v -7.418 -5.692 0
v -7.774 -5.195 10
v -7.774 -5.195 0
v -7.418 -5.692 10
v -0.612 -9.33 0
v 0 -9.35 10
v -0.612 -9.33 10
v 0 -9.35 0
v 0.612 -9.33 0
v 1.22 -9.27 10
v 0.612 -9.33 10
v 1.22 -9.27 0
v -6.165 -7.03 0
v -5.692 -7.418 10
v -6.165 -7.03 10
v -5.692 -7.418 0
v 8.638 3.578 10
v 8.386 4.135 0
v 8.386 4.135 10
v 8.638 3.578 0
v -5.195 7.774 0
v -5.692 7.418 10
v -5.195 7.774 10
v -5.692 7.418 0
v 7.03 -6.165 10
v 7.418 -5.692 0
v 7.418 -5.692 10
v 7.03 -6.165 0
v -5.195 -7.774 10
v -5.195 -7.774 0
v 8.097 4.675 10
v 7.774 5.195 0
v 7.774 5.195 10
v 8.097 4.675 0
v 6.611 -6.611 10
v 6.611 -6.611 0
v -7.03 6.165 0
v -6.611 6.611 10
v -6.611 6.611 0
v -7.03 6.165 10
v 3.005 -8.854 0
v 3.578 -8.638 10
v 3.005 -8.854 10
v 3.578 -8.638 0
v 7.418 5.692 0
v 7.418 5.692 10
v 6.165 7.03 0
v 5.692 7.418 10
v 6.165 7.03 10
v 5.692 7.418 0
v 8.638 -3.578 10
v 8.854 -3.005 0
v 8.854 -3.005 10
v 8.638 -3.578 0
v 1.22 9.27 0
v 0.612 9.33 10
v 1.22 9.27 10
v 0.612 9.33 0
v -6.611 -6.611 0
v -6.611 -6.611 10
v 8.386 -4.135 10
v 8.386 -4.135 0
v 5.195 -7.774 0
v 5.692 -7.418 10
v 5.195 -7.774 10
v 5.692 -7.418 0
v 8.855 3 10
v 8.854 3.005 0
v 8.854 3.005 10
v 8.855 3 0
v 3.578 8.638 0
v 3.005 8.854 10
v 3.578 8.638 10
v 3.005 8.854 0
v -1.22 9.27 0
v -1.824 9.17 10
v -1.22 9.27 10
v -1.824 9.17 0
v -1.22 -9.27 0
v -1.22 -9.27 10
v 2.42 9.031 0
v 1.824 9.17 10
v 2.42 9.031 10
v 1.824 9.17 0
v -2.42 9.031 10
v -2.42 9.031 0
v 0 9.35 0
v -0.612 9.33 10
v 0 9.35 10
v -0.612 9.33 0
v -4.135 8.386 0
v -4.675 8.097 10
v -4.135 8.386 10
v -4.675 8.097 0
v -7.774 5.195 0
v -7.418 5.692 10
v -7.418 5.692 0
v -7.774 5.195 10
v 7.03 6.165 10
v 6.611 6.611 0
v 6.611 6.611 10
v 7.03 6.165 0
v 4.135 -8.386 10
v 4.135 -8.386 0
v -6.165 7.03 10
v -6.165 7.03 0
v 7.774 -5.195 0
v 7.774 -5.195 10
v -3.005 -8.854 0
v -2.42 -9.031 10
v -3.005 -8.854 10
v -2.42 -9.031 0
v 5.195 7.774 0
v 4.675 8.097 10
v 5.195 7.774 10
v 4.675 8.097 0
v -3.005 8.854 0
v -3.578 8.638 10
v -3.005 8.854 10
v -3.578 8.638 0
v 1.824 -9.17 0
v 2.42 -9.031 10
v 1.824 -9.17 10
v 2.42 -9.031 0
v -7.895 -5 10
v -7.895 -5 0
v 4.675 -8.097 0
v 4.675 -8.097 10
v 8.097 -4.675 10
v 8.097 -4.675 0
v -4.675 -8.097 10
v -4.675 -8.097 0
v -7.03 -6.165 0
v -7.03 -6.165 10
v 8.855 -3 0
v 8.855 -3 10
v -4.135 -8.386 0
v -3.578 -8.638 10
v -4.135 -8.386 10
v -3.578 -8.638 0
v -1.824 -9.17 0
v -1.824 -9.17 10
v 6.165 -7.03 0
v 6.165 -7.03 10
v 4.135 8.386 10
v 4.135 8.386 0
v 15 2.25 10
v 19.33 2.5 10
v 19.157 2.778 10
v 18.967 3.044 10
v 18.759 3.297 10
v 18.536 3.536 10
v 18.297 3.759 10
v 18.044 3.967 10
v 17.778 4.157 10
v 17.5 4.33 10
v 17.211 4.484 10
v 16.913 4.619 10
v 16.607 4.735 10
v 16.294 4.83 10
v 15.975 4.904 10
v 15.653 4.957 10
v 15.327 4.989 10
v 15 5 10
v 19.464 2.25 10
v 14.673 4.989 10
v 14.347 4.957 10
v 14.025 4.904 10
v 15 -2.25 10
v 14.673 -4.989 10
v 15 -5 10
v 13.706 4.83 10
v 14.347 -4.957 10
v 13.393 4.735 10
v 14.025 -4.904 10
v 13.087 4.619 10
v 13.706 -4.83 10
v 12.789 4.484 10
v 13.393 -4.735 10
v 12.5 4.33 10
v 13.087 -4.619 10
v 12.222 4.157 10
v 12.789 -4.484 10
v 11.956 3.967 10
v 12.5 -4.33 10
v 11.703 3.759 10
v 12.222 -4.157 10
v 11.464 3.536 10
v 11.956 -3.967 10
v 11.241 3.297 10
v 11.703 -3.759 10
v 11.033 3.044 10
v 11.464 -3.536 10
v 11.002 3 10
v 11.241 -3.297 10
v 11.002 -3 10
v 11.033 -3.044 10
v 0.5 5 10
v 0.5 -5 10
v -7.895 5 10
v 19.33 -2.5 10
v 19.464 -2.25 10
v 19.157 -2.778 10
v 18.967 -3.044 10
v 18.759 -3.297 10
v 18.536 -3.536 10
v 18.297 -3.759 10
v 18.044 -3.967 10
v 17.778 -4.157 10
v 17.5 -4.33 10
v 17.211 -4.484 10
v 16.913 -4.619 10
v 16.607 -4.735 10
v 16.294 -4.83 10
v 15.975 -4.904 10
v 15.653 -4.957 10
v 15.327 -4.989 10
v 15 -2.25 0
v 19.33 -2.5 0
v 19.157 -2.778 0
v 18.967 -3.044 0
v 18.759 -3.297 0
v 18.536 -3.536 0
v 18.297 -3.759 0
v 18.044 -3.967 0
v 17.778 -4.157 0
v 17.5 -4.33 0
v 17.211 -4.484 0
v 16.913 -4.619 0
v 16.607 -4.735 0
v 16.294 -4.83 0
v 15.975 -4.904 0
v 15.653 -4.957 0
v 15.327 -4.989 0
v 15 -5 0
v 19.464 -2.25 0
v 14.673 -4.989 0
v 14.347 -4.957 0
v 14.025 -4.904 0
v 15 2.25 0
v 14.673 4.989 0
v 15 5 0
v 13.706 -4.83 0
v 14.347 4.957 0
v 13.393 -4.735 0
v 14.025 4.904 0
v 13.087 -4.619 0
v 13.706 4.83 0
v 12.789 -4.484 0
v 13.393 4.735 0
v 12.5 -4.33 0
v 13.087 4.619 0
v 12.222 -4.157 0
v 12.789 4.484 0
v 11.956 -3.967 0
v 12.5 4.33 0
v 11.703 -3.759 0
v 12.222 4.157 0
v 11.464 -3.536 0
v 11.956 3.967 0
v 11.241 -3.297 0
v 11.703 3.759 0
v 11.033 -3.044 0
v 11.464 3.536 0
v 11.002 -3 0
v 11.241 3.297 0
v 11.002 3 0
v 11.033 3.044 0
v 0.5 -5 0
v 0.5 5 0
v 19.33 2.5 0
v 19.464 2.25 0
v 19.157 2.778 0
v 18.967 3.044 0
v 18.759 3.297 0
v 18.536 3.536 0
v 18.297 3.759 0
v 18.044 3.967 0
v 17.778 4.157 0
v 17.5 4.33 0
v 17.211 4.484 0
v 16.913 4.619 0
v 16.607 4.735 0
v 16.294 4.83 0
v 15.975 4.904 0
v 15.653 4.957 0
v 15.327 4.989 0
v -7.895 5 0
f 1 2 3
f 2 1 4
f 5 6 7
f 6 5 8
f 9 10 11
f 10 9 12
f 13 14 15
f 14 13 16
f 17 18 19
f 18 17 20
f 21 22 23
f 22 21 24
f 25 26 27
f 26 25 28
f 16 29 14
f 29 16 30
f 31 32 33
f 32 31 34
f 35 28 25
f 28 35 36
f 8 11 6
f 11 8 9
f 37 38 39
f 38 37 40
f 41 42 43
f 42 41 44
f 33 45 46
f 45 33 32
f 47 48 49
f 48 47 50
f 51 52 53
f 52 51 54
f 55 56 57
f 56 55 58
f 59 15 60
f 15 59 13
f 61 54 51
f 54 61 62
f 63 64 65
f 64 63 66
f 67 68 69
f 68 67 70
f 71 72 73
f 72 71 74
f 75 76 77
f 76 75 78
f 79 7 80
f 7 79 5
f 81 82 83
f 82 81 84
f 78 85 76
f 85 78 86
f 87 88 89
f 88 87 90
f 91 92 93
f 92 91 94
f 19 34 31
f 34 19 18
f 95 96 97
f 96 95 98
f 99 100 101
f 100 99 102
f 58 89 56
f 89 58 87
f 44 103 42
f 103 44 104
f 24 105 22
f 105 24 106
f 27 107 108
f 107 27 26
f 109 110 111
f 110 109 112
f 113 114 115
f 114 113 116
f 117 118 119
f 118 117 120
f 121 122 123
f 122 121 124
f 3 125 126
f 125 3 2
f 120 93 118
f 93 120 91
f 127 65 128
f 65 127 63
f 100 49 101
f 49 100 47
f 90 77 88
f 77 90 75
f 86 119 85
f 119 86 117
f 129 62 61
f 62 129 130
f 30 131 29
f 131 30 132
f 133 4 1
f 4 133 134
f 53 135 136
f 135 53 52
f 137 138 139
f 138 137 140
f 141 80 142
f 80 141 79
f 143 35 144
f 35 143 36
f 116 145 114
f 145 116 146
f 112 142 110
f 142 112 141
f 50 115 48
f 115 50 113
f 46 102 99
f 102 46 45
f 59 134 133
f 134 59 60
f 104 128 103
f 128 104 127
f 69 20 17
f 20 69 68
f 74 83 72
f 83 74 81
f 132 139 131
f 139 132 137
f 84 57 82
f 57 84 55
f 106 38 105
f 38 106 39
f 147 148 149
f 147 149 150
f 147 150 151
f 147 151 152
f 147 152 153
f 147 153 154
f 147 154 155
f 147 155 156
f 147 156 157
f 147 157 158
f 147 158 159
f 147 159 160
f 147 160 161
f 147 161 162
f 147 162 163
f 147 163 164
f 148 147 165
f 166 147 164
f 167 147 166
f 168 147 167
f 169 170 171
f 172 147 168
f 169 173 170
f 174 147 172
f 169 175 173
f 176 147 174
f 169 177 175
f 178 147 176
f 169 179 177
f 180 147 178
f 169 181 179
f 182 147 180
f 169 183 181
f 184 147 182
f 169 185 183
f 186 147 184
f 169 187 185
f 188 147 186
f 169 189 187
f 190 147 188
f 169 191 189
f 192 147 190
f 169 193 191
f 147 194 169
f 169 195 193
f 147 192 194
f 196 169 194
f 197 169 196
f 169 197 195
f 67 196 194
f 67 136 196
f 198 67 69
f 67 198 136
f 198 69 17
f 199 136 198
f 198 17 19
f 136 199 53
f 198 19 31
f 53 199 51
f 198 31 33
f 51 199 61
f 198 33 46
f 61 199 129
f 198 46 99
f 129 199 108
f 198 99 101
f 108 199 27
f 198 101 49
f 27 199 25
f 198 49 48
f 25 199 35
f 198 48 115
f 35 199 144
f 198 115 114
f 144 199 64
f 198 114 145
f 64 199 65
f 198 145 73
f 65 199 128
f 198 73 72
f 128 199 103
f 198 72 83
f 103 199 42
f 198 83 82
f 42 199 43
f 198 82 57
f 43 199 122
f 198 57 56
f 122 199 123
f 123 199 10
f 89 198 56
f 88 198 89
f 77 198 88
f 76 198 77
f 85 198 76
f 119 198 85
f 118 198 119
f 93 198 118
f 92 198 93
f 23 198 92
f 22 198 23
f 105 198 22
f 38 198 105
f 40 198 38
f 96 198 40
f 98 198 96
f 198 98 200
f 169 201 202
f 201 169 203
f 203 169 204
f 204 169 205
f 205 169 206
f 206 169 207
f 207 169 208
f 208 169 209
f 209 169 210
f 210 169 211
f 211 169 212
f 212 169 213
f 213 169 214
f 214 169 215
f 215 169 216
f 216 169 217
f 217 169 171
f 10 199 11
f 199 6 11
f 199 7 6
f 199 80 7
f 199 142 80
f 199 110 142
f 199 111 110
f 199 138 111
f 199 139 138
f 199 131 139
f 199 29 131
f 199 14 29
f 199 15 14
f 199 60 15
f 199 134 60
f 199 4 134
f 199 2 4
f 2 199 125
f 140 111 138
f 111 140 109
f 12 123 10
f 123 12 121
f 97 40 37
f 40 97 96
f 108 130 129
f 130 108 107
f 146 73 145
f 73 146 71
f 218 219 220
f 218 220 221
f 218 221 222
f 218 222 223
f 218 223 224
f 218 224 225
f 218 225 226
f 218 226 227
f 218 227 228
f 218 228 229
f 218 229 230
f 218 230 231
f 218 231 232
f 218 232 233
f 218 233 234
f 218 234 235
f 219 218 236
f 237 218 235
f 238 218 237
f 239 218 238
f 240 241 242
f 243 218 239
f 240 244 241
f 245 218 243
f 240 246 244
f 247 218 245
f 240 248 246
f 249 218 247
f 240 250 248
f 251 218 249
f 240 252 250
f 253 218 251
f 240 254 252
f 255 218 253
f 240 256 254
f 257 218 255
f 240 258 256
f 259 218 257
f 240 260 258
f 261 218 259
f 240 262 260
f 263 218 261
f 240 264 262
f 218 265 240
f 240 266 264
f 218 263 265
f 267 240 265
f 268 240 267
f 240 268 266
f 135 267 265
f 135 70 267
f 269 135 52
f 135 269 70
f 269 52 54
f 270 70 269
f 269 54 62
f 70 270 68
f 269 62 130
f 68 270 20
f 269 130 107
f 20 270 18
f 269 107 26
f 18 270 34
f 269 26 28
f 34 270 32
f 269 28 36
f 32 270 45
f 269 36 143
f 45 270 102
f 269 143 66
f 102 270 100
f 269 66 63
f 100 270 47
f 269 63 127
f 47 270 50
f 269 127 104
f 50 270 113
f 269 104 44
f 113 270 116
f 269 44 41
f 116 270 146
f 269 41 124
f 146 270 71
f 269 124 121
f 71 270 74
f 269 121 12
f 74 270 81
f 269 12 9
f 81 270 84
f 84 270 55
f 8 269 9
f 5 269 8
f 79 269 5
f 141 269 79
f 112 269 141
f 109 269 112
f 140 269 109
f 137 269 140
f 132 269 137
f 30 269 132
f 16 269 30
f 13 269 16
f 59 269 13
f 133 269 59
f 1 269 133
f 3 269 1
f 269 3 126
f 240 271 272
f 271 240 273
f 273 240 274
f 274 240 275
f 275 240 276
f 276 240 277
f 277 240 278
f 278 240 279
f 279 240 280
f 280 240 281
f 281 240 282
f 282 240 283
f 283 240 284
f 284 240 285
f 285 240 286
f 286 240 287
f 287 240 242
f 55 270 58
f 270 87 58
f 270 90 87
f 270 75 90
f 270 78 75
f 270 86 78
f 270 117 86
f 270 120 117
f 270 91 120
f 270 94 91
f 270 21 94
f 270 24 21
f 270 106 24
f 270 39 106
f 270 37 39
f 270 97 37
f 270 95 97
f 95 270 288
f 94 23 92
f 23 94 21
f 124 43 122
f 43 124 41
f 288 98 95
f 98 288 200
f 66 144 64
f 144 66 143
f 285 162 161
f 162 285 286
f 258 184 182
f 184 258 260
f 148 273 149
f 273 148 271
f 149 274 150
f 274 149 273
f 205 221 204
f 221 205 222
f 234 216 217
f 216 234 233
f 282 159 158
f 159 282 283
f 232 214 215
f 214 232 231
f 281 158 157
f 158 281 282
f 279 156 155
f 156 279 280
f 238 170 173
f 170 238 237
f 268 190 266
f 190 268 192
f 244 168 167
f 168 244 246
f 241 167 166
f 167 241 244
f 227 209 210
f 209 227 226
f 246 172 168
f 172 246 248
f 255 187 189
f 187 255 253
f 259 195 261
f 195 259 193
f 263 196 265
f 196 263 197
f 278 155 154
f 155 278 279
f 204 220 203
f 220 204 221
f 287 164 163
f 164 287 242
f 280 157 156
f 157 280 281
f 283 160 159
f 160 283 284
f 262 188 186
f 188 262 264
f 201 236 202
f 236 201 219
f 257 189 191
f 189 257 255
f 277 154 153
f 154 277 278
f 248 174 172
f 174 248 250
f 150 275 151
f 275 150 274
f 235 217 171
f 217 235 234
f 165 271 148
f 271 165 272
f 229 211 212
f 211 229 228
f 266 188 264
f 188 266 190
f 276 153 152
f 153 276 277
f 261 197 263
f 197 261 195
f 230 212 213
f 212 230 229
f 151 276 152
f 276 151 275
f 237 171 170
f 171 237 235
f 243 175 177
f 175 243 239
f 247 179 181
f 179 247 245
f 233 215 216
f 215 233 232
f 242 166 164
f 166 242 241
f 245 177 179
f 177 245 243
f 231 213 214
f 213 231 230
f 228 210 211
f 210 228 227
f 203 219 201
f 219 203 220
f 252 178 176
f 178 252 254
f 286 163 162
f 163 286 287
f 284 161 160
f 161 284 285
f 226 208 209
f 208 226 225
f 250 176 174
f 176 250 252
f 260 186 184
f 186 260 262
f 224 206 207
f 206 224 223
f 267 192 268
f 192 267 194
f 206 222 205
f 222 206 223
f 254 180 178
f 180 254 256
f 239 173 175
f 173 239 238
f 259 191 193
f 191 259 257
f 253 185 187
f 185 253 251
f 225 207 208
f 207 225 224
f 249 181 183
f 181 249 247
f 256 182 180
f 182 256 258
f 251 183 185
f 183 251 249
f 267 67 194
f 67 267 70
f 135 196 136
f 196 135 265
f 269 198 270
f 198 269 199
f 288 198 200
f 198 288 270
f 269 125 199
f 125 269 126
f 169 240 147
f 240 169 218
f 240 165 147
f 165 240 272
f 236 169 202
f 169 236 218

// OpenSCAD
// Snap-on tubing clip for a 12.7 mm (1/2 inch) lab stand rod
// Print orientation: flat on the bed, extruded upward in +Z

// ---------------- Parameters ----------------
rod_d        = 12.7;   // stand rod diameter
ring_w       = 3;      // rod ring wall thickness
ring_od      = rod_d + 2 * ring_w;  // rod ring outer diameter (18.7 mm)
ring_id      = rod_d;  // rod ring inner diameter (12.7 mm)

tub_d        = 6;      // tubing ring inner diameter
tub_w        = 2;      // tubing ring wall thickness
tub_od       = tub_d + 2 * tub_w;   // tubing ring outer diameter (10 mm)
tub_x        = 15;     // tubing ring centre X position

bridge_x0    = 8;      // bridge start (X)
bridge_x1    = 12;     // bridge end (X)
bridge_w     = 6;      // bridge width (Y)

opening_rod  = 10;     // rod ring opening width (-X side)
opening_tub  = 4.5;    // tubing ring opening width (+X side)

height       = 10;     // extrusion height (Z)
eps          = 0.5;    // cutter overshoot past faces

$fn = 96;

// ---------------- Model ----------------
difference() {
    union() {
        // Rod ring
        cylinder(d = ring_od, h = height);

        // Tubing ring
        translate([tub_x, 0, 0])
            cylinder(d = tub_od, h = height);

        // Solid bridge between the rings
        translate([bridge_x0, -bridge_w / 2, 0])
            cube([bridge_x1 - bridge_x0, bridge_w, height]);
    }

    // Rod ring opening: removes everything with x < 0 and -5 < y < 5
    translate([-ring_od - eps, -opening_rod / 2, -eps])
        cube([ring_od + 2 * eps, opening_rod, height + 2 * eps]);

    // Tubing ring opening: removes x > 15 and -2.25 < y < 2.25
    translate([tub_x, -opening_tub / 2, -eps])
        cube([ring_od + 2 * eps, opening_tub, height + 2 * eps]);
}
